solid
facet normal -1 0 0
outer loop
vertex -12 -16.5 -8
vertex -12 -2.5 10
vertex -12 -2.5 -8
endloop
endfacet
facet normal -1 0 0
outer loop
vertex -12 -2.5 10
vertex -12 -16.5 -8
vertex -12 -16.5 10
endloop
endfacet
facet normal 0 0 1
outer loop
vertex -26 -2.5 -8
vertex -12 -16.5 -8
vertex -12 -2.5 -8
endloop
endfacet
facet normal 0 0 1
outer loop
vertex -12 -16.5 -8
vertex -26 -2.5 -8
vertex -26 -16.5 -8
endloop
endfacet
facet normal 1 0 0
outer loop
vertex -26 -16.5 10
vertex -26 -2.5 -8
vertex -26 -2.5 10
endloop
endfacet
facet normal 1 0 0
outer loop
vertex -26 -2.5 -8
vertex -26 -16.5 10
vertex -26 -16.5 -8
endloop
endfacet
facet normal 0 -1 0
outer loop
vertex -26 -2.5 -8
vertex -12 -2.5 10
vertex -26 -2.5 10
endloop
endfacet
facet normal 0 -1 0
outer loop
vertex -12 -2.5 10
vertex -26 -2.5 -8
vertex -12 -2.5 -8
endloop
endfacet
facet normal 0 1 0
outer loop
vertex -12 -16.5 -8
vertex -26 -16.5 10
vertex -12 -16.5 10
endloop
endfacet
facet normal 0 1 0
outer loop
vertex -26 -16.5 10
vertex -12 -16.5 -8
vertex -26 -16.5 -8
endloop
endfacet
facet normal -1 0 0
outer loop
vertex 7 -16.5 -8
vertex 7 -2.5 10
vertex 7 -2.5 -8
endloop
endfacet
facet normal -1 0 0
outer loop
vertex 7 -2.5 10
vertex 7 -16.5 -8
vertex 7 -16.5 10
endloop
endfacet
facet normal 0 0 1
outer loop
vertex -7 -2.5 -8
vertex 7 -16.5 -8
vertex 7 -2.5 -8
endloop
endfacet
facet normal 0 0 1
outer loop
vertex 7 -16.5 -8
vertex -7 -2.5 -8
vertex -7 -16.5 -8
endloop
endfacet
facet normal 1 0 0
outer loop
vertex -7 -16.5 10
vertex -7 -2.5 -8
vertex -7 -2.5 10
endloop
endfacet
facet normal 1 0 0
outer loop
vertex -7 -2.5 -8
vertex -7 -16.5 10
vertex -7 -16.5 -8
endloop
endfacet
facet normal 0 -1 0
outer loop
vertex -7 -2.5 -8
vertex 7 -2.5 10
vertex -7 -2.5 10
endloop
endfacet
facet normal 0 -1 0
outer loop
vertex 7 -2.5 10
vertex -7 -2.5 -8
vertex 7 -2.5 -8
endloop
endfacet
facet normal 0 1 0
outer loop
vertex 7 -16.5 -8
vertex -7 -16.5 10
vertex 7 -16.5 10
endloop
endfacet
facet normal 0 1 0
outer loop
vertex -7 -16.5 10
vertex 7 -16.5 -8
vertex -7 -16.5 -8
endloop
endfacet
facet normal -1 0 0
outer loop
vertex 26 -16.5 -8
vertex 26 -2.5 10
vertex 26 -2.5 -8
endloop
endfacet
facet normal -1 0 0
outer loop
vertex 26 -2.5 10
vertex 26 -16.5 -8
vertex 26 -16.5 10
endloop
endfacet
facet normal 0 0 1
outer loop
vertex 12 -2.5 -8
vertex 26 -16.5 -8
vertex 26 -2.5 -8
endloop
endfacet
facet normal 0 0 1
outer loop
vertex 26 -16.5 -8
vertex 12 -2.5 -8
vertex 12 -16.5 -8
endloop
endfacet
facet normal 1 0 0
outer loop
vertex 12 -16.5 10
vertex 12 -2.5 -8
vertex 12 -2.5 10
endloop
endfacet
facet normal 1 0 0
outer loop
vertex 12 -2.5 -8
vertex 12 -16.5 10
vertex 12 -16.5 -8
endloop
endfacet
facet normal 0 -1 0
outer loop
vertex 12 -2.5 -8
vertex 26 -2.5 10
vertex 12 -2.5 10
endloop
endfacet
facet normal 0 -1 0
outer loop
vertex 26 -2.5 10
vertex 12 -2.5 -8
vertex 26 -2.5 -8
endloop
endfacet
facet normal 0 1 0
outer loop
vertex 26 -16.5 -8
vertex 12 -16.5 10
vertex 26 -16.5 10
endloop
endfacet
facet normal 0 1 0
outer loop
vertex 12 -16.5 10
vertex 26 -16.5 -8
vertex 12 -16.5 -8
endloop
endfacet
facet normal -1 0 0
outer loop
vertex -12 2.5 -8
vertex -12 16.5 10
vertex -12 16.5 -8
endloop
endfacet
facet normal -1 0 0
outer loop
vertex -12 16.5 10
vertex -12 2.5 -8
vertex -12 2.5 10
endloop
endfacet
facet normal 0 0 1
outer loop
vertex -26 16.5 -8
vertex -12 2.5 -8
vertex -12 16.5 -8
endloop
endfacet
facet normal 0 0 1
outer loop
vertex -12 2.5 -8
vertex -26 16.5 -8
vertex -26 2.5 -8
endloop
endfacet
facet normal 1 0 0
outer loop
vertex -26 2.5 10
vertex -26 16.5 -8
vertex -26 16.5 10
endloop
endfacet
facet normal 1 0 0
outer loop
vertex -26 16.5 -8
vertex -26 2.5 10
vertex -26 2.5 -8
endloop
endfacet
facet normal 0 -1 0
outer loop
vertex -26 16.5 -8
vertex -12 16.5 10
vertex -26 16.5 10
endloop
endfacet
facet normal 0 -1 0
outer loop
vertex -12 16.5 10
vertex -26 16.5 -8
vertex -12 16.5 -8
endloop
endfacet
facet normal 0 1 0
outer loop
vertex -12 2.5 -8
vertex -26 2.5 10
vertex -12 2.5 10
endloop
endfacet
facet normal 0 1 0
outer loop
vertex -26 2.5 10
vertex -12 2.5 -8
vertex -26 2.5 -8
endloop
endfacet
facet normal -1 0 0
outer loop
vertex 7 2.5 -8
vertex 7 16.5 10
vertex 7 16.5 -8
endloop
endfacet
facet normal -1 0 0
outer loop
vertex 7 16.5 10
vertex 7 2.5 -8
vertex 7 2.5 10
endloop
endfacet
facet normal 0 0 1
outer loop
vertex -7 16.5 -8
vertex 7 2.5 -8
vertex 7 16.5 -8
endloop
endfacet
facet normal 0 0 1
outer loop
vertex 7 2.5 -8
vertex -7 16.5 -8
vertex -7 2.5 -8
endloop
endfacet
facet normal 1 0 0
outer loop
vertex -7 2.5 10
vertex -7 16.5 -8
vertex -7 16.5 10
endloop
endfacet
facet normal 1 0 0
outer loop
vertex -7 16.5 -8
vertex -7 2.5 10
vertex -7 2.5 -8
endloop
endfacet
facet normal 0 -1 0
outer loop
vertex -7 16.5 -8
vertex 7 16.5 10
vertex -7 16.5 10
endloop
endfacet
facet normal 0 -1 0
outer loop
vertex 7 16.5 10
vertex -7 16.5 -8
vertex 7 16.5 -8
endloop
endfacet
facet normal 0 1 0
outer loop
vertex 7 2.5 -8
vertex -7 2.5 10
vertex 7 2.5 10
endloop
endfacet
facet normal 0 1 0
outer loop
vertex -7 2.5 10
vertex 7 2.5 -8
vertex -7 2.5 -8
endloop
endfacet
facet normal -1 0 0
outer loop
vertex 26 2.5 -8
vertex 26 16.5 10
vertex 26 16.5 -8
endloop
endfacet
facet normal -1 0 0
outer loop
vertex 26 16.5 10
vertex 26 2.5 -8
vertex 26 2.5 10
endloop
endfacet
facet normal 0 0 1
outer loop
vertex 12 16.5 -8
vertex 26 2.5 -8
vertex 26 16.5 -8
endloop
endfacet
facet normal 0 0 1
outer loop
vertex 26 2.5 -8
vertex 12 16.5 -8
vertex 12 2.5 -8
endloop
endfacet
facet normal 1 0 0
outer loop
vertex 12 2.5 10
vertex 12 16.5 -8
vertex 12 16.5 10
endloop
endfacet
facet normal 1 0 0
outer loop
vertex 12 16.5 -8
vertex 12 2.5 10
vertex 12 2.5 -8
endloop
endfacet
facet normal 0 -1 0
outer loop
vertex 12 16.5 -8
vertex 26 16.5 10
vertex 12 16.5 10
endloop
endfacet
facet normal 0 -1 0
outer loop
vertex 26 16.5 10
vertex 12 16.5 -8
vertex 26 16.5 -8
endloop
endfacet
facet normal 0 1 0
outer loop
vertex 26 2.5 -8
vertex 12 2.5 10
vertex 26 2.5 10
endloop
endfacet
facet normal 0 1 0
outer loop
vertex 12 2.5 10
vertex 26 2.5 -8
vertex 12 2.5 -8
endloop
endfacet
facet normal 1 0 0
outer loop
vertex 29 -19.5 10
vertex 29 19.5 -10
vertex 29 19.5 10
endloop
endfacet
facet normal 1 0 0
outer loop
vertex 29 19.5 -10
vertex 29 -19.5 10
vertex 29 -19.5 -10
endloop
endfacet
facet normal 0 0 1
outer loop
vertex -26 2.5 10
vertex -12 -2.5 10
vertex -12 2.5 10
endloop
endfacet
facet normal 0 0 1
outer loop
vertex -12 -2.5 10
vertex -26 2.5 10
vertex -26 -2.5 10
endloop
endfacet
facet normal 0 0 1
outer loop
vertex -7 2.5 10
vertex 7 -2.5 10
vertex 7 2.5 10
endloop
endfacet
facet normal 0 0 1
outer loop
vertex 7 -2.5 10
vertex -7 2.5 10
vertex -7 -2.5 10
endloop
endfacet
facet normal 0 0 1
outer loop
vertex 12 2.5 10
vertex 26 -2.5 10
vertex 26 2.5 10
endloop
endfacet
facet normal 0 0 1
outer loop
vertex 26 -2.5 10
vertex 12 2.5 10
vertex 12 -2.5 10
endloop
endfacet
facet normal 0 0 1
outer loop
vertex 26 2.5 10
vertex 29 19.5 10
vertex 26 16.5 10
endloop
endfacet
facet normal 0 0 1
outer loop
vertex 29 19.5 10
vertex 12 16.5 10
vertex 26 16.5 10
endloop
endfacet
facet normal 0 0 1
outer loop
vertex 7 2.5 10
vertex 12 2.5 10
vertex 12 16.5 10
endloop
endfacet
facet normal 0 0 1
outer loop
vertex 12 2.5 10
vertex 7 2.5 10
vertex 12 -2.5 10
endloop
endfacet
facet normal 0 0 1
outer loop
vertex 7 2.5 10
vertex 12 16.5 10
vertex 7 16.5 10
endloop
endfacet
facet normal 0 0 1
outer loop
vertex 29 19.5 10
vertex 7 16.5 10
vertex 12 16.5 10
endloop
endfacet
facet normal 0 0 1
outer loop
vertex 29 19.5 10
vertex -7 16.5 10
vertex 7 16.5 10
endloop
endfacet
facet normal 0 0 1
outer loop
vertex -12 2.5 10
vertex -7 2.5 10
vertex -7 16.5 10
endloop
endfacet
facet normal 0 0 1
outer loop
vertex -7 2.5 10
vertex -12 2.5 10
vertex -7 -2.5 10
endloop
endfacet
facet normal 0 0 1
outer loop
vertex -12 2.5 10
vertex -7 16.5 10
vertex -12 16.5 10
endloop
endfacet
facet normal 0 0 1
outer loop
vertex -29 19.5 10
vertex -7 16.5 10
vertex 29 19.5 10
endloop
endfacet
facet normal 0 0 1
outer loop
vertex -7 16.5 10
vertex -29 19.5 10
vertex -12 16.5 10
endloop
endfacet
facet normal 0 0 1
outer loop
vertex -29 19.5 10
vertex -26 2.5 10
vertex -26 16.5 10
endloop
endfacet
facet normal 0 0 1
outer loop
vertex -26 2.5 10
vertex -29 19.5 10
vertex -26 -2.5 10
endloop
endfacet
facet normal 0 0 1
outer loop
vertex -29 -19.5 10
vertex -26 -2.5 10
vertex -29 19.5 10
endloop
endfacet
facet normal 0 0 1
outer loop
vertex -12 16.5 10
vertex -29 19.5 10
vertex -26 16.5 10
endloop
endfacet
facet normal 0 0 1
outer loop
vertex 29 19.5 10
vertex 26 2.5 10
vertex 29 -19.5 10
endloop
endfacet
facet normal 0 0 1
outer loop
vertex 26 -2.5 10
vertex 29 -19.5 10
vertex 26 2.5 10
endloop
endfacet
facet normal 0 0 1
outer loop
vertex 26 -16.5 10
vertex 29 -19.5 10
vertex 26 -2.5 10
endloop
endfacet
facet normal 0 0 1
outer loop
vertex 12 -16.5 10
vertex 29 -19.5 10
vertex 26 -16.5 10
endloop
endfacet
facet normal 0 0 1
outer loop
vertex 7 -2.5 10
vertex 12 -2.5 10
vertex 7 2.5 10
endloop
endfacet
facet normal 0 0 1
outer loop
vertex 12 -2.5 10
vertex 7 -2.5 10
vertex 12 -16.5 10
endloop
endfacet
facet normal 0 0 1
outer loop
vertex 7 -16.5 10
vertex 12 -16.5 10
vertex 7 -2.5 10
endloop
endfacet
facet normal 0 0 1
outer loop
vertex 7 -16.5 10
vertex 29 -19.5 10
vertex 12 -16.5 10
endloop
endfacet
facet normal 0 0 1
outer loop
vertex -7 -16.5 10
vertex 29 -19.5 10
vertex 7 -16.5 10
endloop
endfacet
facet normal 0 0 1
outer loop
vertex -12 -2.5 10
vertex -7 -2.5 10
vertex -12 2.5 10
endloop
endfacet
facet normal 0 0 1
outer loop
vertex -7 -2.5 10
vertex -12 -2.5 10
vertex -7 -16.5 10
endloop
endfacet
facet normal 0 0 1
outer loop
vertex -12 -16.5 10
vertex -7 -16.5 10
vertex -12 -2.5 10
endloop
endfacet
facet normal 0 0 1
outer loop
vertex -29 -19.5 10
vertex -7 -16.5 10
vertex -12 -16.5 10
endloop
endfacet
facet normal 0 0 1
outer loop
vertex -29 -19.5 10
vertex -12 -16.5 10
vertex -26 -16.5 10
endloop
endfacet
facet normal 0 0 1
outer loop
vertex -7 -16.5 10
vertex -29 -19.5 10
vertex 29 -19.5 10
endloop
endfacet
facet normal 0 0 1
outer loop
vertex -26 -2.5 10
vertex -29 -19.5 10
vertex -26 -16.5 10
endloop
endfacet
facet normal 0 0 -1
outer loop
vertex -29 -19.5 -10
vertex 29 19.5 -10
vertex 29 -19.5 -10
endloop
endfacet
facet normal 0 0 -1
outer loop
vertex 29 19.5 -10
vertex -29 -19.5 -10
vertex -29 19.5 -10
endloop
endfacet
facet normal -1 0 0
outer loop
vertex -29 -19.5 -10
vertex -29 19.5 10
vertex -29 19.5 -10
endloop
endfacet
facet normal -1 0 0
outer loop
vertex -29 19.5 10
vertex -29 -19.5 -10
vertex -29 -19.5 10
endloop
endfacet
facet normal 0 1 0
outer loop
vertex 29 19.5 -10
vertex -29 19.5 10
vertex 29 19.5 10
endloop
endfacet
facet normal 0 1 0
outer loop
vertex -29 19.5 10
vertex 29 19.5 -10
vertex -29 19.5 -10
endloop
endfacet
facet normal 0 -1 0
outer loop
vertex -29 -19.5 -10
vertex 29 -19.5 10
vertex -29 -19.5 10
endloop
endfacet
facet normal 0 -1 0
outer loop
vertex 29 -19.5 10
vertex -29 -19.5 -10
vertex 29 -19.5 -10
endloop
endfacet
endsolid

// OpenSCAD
$fn = 32;

// ----------------------------------------------------------------------
// Pocket plate 58 x 39 x 20
// 2 x 3 pockets 14 mm square, 18 mm deep
// ----------------------------------------------------------------------

// --- parameters (mm) ---
thickness = 20;  // plate thickness
floor_t = 2;     // material left under each pocket
pocket = 14;     // pocket side length
pitch_x = 19;    // pocket pitch along X
pitch_y = 19;    // pocket pitch along Y
cols = 3;        // pockets per row
rows = 2;        // rows of pockets

// --- derived feature positions (mm) ---
depth = thickness - floor_t;        // = 18   pocket depth, down to the floor
span_x = (cols - 1) * pitch_x;      // = 38   distance between outer pockets
span_y = (rows - 1) * pitch_y;      // = 19   distance between outer pocket rows
origin_x = -span_x / 2;             // = -19   X of the first pocket
origin_y = -span_y / 2;             // = -9.5   Y of the first pocket
plate = [span_x + pocket + 6, span_y + pocket + 6, thickness];  // = [58, 39, 20]   overall size: pockets plus 3 mm of wall on each side
feature_centers = [
  [origin_x + 0 * pitch_x, origin_y + 0 * pitch_y],
  [origin_x + 1 * pitch_x, origin_y + 0 * pitch_y],
  [origin_x + 2 * pitch_x, origin_y + 0 * pitch_y],
  [origin_x + 0 * pitch_x, origin_y + 1 * pitch_y],
  [origin_x + 1 * pitch_x, origin_y + 1 * pitch_y],
  [origin_x + 2 * pitch_x, origin_y + 1 * pitch_y]
];   // pocket centres, used verbatim by the cutter loop

// plate outline, then one pocket per centre in feature_centers
difference() {
  cube(plate, center = true);
  for (centre = feature_centers)
    translate([centre[0] - pocket / 2, centre[1] - pocket / 2, plate[2] / 2 - depth])
      cube([pocket, pocket, depth + 1]);  // centred on the declared pocket centre
}
